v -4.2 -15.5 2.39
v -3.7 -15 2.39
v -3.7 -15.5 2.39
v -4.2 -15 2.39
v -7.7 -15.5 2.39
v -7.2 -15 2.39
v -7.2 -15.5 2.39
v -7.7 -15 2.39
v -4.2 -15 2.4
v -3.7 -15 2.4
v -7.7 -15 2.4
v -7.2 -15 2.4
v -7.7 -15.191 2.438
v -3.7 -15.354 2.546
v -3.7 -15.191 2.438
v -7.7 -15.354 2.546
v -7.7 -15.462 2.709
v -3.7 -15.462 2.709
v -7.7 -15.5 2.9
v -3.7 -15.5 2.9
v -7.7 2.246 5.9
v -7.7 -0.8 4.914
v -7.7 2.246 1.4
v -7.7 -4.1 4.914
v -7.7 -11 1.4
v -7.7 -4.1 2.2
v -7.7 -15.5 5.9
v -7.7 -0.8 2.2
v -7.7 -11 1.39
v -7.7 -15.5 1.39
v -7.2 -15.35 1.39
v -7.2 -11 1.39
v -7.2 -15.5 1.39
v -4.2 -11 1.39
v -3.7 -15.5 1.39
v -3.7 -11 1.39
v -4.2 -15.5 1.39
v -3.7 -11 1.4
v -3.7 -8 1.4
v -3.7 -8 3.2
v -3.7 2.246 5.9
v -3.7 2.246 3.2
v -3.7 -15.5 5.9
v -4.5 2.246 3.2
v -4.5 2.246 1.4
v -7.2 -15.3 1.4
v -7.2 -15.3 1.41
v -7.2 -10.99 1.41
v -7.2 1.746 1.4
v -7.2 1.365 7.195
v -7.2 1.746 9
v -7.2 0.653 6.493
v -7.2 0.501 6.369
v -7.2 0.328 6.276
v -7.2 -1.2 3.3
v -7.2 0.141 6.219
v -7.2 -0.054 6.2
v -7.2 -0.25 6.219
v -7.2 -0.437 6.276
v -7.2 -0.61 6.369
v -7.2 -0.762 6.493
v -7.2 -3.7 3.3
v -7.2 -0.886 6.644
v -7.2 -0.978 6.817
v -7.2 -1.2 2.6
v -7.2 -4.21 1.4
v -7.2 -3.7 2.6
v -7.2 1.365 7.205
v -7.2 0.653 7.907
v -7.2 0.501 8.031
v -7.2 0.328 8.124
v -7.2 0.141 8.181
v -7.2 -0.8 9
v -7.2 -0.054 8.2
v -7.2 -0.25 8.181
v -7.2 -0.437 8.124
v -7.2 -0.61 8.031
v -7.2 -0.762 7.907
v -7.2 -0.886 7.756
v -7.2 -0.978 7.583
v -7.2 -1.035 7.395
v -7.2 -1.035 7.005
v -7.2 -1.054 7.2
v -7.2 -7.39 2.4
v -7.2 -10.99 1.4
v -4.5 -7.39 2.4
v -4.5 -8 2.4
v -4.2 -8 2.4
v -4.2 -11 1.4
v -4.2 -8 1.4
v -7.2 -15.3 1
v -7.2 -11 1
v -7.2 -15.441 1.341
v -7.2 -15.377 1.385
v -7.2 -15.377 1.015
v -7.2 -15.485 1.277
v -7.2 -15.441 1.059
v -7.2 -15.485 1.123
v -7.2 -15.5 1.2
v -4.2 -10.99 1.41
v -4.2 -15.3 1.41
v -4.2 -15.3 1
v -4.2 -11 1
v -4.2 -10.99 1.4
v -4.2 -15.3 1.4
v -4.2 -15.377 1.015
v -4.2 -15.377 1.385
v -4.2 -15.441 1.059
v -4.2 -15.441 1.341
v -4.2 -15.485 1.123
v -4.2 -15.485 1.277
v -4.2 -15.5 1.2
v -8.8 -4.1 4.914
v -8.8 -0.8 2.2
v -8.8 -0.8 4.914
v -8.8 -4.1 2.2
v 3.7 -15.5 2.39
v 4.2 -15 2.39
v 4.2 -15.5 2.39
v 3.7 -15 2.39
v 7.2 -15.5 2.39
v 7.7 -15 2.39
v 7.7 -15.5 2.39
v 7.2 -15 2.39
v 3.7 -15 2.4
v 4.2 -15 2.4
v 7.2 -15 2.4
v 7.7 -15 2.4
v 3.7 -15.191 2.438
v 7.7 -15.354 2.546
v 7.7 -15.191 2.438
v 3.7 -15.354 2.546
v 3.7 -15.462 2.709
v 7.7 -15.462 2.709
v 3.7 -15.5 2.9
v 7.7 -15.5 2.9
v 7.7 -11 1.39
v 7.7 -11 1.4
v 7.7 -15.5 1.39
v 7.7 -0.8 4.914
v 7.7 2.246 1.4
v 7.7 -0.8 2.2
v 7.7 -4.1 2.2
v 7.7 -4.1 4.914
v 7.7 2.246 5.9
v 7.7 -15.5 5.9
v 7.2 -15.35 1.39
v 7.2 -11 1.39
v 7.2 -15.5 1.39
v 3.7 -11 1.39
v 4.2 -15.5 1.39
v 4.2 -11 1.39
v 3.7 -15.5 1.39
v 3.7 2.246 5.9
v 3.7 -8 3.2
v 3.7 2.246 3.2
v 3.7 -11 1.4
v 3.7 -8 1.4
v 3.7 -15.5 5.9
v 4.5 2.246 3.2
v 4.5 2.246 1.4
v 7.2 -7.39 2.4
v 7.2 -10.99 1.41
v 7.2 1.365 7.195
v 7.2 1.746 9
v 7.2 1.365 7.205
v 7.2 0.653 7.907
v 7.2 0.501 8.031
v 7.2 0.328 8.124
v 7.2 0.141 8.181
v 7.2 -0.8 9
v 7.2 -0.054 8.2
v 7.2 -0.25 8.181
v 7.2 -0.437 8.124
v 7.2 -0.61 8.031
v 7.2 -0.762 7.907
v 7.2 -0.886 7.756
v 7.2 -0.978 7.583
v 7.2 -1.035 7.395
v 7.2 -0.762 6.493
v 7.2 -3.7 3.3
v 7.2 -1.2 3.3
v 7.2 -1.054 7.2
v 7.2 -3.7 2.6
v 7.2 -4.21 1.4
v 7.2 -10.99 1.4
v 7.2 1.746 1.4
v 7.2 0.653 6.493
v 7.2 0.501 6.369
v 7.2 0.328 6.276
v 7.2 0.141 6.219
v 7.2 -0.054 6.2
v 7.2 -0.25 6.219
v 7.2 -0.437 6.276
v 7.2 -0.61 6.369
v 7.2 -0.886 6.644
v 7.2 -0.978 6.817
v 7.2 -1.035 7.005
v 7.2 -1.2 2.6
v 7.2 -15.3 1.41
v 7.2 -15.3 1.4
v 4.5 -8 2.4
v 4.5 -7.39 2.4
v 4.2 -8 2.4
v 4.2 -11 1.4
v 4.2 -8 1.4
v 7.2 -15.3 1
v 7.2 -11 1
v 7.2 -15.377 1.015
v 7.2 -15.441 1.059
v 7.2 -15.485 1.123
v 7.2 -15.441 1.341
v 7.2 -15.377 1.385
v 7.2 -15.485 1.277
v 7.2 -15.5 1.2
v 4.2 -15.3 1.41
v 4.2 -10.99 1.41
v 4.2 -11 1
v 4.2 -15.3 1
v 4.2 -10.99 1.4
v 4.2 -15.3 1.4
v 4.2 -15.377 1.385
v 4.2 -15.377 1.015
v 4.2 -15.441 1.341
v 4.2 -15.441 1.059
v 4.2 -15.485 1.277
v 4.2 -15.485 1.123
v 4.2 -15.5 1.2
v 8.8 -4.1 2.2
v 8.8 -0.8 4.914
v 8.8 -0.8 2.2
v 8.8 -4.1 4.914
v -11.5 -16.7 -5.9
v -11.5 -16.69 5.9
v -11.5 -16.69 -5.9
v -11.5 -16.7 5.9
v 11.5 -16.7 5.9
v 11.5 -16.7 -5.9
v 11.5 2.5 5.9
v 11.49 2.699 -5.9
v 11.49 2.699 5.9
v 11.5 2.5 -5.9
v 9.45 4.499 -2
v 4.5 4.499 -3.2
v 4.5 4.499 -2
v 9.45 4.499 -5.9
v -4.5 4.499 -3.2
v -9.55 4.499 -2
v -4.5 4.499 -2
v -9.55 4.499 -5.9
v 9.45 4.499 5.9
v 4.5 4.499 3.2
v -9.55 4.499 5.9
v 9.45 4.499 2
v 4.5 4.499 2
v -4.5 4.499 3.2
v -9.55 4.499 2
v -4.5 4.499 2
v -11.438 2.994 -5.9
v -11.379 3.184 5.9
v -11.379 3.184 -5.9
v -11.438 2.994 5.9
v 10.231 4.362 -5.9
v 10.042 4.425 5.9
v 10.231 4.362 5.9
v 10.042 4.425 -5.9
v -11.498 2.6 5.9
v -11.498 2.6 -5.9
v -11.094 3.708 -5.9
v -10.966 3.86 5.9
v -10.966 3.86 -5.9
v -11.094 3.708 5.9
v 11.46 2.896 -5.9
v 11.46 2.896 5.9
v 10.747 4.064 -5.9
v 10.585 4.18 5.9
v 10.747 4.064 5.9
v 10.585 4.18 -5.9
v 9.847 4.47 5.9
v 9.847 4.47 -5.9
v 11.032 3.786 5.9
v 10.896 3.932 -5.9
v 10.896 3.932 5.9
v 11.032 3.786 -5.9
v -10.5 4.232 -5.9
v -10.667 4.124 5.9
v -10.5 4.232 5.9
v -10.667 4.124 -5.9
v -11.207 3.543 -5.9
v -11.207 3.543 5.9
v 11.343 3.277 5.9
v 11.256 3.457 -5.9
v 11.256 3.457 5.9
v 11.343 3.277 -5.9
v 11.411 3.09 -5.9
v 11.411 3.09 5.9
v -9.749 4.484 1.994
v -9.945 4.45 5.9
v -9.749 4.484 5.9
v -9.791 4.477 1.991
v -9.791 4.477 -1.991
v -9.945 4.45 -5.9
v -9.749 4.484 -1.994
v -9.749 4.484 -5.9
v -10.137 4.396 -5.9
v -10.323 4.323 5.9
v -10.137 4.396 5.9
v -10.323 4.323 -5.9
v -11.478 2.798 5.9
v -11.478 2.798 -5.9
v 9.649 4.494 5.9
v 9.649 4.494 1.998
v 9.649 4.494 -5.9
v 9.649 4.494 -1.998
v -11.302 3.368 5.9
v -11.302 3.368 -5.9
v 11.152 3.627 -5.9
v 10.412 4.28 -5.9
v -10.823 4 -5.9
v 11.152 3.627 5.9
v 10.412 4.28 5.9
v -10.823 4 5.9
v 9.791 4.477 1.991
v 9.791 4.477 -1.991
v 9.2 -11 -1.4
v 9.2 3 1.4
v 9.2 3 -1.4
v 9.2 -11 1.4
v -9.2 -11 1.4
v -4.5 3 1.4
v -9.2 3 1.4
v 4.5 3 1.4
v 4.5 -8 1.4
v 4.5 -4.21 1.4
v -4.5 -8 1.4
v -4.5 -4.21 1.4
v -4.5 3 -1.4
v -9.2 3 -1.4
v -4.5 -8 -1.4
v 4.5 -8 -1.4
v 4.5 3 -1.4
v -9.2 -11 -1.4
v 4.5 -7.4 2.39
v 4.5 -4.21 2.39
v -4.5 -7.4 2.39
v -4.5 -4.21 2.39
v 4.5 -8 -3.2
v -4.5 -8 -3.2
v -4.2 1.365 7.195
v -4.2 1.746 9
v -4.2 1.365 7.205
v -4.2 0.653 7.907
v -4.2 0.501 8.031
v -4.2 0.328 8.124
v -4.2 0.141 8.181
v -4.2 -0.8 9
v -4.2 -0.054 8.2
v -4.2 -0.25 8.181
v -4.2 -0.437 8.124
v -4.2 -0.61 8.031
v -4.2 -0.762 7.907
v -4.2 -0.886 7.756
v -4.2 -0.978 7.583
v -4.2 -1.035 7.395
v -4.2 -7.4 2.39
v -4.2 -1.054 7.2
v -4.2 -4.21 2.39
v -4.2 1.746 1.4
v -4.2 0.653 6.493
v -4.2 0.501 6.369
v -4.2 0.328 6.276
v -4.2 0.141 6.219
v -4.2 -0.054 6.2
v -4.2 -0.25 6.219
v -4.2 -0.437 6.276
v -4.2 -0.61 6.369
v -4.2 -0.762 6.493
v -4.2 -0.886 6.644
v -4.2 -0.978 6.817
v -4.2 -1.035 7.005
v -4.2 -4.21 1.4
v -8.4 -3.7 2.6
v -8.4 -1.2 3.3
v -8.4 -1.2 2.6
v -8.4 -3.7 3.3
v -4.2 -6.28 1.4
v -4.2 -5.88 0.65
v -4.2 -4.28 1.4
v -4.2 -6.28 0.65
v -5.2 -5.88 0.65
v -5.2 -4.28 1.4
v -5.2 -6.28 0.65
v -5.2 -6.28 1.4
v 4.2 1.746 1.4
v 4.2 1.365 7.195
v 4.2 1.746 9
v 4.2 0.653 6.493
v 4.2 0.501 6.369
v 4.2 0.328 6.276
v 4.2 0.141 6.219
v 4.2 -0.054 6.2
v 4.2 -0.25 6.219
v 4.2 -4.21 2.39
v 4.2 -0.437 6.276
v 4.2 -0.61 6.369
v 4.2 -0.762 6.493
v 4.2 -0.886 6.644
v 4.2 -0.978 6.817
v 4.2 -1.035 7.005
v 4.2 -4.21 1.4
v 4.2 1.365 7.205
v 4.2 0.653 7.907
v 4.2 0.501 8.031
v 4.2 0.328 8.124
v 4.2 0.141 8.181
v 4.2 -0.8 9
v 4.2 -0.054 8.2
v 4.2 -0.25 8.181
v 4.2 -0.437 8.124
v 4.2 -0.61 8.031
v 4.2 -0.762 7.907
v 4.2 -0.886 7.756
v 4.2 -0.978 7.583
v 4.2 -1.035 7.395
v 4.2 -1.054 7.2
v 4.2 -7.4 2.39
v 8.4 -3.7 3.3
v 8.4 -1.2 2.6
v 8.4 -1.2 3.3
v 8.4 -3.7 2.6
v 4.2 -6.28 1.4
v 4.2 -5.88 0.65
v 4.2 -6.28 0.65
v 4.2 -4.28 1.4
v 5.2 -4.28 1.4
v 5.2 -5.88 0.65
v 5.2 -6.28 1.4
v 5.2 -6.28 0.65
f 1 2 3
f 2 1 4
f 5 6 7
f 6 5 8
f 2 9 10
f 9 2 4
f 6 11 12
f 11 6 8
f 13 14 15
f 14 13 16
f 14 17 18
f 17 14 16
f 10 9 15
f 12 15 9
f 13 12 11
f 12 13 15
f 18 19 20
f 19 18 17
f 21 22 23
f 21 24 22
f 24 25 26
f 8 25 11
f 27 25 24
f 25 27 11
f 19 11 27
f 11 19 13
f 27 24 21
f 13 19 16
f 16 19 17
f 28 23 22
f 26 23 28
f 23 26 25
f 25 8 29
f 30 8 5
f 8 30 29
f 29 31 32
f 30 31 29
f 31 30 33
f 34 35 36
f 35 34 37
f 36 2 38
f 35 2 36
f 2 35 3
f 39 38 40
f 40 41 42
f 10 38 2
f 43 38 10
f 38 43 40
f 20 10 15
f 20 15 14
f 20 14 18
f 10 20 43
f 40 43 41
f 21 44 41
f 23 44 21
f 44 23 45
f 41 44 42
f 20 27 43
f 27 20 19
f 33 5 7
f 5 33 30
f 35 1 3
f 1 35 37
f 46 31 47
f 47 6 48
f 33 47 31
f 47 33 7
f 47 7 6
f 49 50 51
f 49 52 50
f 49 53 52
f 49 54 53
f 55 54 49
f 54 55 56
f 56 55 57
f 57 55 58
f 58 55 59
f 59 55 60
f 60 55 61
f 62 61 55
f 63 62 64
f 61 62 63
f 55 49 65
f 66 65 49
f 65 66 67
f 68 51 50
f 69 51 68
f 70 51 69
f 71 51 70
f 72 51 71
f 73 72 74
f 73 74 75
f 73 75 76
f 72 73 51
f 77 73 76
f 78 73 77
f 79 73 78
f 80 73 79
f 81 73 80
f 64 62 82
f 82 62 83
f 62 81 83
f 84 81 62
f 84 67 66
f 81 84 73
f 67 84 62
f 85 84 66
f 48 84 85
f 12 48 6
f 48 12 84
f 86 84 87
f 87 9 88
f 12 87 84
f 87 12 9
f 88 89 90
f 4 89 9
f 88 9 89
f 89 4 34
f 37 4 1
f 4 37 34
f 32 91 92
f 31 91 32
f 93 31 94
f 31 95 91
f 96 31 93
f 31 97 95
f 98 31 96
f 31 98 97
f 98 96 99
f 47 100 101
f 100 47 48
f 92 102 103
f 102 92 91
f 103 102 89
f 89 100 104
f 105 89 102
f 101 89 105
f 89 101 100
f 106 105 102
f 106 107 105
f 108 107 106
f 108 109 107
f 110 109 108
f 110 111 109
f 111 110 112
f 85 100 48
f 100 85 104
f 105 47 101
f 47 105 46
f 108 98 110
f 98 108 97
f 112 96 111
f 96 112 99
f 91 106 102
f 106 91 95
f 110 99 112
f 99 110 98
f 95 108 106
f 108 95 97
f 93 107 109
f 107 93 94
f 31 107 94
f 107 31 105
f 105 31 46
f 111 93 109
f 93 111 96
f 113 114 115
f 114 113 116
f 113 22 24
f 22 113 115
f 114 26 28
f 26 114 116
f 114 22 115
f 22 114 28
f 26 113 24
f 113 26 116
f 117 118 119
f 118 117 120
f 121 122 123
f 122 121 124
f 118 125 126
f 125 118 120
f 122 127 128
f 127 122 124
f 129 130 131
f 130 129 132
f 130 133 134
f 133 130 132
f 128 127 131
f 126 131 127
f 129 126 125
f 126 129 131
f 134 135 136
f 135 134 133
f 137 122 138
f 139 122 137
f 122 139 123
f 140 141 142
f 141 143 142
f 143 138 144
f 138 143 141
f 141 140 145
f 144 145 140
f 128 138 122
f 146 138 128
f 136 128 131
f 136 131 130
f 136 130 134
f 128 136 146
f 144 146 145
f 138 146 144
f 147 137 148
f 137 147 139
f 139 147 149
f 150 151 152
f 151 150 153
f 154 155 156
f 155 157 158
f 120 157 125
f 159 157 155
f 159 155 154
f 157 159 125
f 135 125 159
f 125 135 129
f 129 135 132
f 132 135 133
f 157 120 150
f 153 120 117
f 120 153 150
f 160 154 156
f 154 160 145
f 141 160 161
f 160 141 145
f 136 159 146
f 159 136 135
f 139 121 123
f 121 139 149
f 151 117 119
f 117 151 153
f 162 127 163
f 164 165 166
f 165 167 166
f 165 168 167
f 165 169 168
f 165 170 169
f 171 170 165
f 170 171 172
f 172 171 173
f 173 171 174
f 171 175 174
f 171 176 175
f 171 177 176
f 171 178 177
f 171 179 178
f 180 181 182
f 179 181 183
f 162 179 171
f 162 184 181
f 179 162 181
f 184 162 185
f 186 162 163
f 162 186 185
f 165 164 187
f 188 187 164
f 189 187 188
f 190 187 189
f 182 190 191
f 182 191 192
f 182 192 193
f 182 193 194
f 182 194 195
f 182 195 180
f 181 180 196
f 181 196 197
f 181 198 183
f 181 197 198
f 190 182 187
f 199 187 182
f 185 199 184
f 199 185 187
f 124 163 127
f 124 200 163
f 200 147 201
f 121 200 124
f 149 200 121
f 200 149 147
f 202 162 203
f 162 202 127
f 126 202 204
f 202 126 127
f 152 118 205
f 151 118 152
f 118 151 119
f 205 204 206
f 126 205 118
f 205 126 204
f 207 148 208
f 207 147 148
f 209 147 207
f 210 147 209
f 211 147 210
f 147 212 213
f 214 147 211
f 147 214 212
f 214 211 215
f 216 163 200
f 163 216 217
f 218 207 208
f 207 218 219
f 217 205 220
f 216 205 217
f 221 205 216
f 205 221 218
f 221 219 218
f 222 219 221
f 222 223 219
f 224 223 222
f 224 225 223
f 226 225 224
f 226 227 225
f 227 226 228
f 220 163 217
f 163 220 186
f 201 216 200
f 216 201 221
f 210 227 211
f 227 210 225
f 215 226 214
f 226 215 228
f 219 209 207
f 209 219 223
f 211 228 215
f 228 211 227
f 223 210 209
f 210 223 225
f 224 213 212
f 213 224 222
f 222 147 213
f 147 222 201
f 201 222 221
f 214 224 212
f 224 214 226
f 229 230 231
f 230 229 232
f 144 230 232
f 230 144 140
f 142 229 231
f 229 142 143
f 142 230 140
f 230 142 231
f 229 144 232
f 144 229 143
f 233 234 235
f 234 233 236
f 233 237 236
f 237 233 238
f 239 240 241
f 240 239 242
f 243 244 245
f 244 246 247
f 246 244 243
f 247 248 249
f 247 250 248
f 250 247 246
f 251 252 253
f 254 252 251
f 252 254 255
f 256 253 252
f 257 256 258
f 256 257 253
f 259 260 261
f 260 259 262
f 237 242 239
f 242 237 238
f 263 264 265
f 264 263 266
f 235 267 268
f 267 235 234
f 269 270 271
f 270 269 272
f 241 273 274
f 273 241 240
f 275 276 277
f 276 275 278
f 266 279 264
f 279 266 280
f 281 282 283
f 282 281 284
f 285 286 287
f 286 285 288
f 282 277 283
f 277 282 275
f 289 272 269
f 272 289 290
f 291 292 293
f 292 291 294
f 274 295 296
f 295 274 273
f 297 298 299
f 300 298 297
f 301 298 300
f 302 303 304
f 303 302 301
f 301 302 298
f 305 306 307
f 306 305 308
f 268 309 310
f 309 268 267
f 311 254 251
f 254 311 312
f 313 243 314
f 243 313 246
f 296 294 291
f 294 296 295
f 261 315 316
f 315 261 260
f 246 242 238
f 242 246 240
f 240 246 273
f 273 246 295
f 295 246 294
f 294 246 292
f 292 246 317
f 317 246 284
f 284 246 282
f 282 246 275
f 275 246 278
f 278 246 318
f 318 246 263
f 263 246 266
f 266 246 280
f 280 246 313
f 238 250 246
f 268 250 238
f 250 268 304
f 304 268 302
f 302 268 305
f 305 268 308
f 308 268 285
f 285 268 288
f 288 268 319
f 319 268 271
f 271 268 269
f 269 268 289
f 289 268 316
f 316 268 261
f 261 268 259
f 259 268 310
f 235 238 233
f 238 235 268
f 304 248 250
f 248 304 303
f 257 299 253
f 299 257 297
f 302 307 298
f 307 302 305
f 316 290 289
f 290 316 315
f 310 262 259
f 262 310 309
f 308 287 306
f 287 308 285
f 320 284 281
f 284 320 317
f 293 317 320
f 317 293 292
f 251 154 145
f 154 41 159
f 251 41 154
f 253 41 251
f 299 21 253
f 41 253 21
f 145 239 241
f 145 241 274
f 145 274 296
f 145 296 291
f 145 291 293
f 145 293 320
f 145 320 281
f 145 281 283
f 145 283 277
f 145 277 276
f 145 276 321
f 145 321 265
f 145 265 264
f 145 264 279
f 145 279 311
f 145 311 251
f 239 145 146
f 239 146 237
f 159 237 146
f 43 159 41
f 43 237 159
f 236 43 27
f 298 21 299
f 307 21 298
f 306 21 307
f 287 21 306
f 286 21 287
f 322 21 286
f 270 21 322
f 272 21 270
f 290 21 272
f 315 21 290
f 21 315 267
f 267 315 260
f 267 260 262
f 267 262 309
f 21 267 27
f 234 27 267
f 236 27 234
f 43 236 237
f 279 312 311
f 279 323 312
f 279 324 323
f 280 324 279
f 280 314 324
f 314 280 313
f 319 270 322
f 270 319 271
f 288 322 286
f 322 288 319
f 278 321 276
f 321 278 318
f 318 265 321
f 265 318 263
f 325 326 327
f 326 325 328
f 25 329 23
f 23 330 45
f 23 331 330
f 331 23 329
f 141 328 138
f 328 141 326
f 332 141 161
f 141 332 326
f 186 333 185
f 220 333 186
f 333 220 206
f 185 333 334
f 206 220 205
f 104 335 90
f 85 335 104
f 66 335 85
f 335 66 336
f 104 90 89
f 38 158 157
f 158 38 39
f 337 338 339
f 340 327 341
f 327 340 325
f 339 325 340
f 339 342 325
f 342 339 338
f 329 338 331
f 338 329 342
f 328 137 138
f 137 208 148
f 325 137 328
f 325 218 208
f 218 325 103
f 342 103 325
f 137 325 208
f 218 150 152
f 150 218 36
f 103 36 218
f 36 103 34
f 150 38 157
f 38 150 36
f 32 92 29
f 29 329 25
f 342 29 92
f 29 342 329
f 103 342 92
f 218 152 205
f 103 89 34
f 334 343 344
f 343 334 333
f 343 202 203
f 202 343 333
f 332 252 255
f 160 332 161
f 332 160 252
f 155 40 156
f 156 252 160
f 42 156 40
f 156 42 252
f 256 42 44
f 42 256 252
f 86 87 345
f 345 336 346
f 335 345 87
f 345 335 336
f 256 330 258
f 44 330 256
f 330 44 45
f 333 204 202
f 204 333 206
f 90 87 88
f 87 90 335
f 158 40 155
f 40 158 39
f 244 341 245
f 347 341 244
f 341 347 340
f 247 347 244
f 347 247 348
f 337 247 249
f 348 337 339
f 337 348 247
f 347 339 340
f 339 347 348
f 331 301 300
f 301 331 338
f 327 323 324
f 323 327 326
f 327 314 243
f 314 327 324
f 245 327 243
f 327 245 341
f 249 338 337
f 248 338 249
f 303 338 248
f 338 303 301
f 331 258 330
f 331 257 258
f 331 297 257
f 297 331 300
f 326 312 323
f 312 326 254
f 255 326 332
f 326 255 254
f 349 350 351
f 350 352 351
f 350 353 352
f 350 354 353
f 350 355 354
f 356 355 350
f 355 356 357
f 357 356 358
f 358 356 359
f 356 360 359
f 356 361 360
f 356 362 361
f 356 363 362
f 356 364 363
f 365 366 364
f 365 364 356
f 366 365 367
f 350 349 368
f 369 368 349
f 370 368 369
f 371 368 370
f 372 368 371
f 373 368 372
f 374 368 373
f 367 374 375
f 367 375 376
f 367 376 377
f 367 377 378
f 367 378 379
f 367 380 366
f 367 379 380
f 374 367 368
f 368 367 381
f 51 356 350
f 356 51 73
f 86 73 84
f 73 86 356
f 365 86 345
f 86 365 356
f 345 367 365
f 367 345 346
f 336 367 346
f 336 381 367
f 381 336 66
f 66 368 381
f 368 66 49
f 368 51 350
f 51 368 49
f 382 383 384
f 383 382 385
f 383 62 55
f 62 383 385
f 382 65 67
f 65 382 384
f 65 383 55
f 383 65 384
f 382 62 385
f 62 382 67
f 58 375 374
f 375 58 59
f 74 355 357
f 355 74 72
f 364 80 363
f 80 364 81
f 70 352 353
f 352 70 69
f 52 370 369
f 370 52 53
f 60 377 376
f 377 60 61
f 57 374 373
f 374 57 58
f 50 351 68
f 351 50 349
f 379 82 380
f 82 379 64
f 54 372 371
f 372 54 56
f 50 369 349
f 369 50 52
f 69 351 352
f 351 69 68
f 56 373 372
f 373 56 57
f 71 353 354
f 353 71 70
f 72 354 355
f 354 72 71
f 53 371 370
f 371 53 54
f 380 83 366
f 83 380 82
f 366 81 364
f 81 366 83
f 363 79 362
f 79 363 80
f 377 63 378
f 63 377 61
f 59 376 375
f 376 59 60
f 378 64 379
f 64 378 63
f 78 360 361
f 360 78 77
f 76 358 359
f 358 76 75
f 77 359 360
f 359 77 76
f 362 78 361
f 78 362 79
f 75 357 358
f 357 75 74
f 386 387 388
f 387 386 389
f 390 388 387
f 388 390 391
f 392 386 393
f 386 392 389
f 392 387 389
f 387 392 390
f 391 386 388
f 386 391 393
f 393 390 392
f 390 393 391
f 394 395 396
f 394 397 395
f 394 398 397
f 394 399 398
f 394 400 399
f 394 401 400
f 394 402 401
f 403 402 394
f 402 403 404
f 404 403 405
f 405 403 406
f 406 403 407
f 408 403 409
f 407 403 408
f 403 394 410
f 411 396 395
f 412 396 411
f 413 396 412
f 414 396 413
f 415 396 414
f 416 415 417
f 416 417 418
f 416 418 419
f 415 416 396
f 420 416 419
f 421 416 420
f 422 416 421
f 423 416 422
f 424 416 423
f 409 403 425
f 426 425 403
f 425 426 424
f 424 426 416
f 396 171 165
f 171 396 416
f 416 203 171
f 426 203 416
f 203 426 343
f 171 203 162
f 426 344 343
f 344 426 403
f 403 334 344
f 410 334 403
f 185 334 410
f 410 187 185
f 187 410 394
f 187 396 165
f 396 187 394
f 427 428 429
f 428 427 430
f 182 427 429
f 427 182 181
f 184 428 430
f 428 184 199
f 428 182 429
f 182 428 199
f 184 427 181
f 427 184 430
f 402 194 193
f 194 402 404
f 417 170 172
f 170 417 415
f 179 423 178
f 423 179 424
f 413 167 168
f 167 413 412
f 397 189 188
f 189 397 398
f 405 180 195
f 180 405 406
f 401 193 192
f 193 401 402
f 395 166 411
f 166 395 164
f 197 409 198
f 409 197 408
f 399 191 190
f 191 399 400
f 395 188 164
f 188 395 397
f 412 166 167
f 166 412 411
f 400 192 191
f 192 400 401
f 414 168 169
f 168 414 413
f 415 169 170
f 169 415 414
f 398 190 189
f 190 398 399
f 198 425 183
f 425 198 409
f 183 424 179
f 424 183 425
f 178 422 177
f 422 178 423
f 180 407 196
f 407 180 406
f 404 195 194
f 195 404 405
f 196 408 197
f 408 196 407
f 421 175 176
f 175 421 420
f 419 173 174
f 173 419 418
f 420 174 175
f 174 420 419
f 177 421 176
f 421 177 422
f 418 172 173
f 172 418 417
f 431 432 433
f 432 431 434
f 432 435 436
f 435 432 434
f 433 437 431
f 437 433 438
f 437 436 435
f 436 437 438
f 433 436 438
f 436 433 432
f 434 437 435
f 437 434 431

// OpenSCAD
// file: strain_gauge_plate.scad
// Strain-gauge flexure plate
//
// Geometry taken from StrainGauge.step (Onshape AP242 export, "Part Studio 1 -
// Part 1"). The STEP profile is reproduced segment for segment, so this model
// and the CAD file describe the same solid.
//
// The bought load cell is shorter [measured 2026-11-21]: 30 x 23.3 x 2.5, its arms and
// the W's bottom block ending 1.7 earlier at the open edge (-y); the slots' closed ends
// and the top are as in the STEP. So every point of the profile at the open edge
// (y <= -11) moves up by `shorter`, and the plate runs from y = -10.8 to +12.5: the
// origin stays where the STEP's centre is, so the holders keep their frame.
//
// The STEP's envelope 30 x 25 x 2.5 mm. Two hairpin slots, 3 mm wide, open at the bottom
// edge, run up the plate, turn across the top and return to a closed end. Arms
// and webs are also 3 mm wide, and every free end is a half-round cap of that
// diameter. All corners are R1.5 except the two top corners at R3.
//
// Coordinates: origin at the centre of the part in all three axes, so the
// material runs from z = -thickness/2 to +thickness/2. The STEP file itself
// places the plate from z = 0 upwards — this model is shifted down by 1.25 mm
// against it, everything else is identical.

/* [Size] */
thickness = 2.5;     // mm, as modelled in the STEP
shorter   = 1.7;     // mm the bought cell's arms end earlier [measured 2026-11-21]; 0: the STEP

/* [Output] */
export_2d = false;   // true renders the flat profile only

/* [Resolution] */
arc_step = 3;        // degrees per tessellated arc segment

// Profile loop as exported from the STEP, in mm:
//   ["L", start, end]
//   ["A", start, end, centre, radius, counter-clockwise]
profile = [
  ["A", [-7.5, -12.5], [-9, -11], [-7.5, -11], 1.5, false],
  ["L", [-9, -11], [-9, 2]],
  ["A", [-9, 2], [-6, 2], [-7.5, 2], 1.5, false],
  ["L", [-6, 2], [-6, -5]],
  ["A", [-6, -5], [-3, -5], [-4.5, -5], 1.5, true],
  ["L", [-3, -5], [-3, 5]],
  ["A", [-3, 5], [-4.5, 6.5], [-4.5, 5], 1.5, true],
  ["L", [-4.5, 6.5], [-10.5, 6.5]],
  ["A", [-10.5, 6.5], [-12, 5], [-10.5, 5], 1.5, true],
  ["L", [-12, 5], [-12, -11]],
  ["A", [-12, -11], [-15, -11], [-13.5, -11], 1.5, false],
  ["L", [-15, -11], [-15, 9.5]],
  ["A", [-15, 9.5], [-12, 12.5], [-12, 9.5], 3, false],
  ["L", [-12, 12.5], [12, 12.5]],
  ["A", [12, 12.5], [15, 9.5], [12, 9.5], 3, false],
  ["L", [15, 9.5], [15, -11]],
  ["A", [15, -11], [12, -11], [13.5, -11], 1.5, false],
  ["L", [12, -11], [12, 5]],
  ["A", [12, 5], [10.5, 6.5], [10.5, 5], 1.5, true],
  ["L", [10.5, 6.5], [4.5, 6.5]],
  ["A", [4.5, 6.5], [3, 5], [4.5, 5], 1.5, true],
  ["L", [3, 5], [3, -5]],
  ["A", [3, -5], [6, -5], [4.5, -5], 1.5, true],
  ["L", [6, -5], [6, 2]],
  ["A", [6, 2], [9, 2], [7.5, 2], 1.5, false],
  ["L", [9, 2], [9, -11]],
  ["A", [9, -11], [7.5, -12.5], [7.5, -11], 1.5, false],
  ["L", [7.5, -12.5], [-7.5, -12.5]]
];

function ang(c, p) = atan2(p[1] - c[1], p[0] - c[0]);

function seg_points(s) =
    s[0] == "L" ? [s[1]]
    : let (c = s[3], r = s[4], ccw = s[5],
           a1 = ang(c, s[1]),
           a2raw = ang(c, s[2]),
           a2 = ccw ? (a2raw <= a1 ? a2raw + 360 : a2raw)
                    : (a2raw >= a1 ? a2raw - 360 : a2raw),
           n = max(2, ceil(abs(a2 - a1) / arc_step)))
      [for (i = [0 : n - 1])
          let (a = a1 + (a2 - a1) * i / n)
          [c[0] + r * cos(a), c[1] + r * sin(a)]];

function outline() = [for (s = profile) for (p = seg_points(s)) p[1] <= -11 + 1e-6 ? [p[0], p[1] + shorter] : p];

module plate_profile() { polygon(outline()); }

if (export_2d) plate_profile();
else linear_extrude(height = thickness, center = true) plate_profile();
// main file
// Inner holder for the strain-gauge flexure plate
//
// Slides onto the W-shaped inner part from below (+y in the top view) and grips
// it from above and below. The gauge leads run forward and leave through the
// mouth, in +y, towards the outer holder. It stays clear of the two outer arms, which are the
// fixed mounting points, so this holder can move with the loaded inner part.
//
// Coordinates: origin at the centre of the plate in all three axes, so the
// plate runs from z = -plate_t/2 to +plate_t/2 and this holder is symmetric
// about z = 0.
//
// Printing: stand it on the closed end (the bridge, -y) with the mouth facing
// up. The pocket is then a blind slot opening upwards, so nothing has to be
// bridged or supported, and both fitted dimensions lie in the machine's XY
// plane, where they behave the same way. Printed the other way up, the top
// plate has to bridge 18 mm and lands rough on the face that grips the plate.
//
// The W is the bottom block with its three upward prongs: the two webs at
// |x| = 6..9 and the central column at |x| < 3. The open slots at |x| = 9..12
// run from the bottom edge up to y = 6.5, which is what the side walls use to
// reach through the plate.

/* [Flexure plate — read from the STEP, do not edit; plate_bot the bought cell's] */
plate_t    = 2.5;    // plate thickness
web_outer  = 9;      // outer face of the webs = inner edge of the open slot
arm_inner  = 12;     // inner face of the outer arms = outer edge of the slot
plate_bot  = -10.8;  // bottom edge of the plate: the bought cell's [measured 2026-11-21;
                     //   -12.5 in the STEP] (strain_gauge_plate.scad, shorter)
web_tip    = 3.5;    // top of the two web prongs
slot_top   = 6.5;    // where the open slots close at the U-turn

/* [Holder] */
wall       = 4.5;    // thickness above and below the plate [given: thicker walls for strength;
                     //   was 3: bending stress in them about (3/4.5)^2 = 0.44 as much]
fit        = 0.3;    // clearance on the plate thickness, total (0.15 per face)
w_clear    = 0.2;    // clearance to the W — this is the sliding fit.
                     //   0.05  precision machined
                     //   0.1   milled / reamed
                     //   0.15  SLA / resin, or a well tuned FDM machine
                     //   0.2   FDM  (default — set for 3D printing)
                     // The walls guide along 17 mm of the webs, so too tight
                     // here binds rather than grips.
arm_clear  = 0.5;    // clearance to the fixed outer arms — must never touch
reach      = 1.0;    // how far past the web tips the holder covers
back       = 5.7;    // thickness of the closing bridge below the plate: 4 below the STEP's
                     //   edge, and the 1.7 the bought cell is shorter, so that the holder's
                     //   back (y -16.7), the tongue's root in the bridge and the bass's socket
                     //   stay where they were
corner_r   = 2;      // radius on the two vertical edges at the mouth corners,
                     // i.e. at (+x, y_front) and (-x, y_front)
side_walls = true;   // true: walls reach through the open slots (stiffer box)

/* [Lead-in] */
lead_in    = 1.5;    // length of the flared mouth, 0 disables it
lead_c     = 0.6;    // how much the mouth is flared, per side

/* [Gauge and cable recess] */
recess_d   = 1.8;    // depth, cut into the inner face of each plate. The bought cell's lead
                     //   is glued along the whole column, across its width, 4 thick on the
                     //   plate's 2.5: 1.5 proud of one face [measured 2026-11-21]; 1.8 and
                     //   the 0.15 fit leave it 0.45 (was 1.0, for the STEP's bare plate).
                     //   The glue is 7.1 wide at most and runs from the +y edge to y -6.5:
                     //   0.95 to the recess's sides, 1.5 to its back end (recess_back)
                     //   Both faces, so the plate goes in either way up
recess_w   = 9.0;    // width, centred on the column. The column is 6 mm wide
                     // and the inner slots run from |x| = 3 to 6, so 9 mm puts
                     // the recess edges mid-slot: 1.5 mm clear of the column,
                     // 1.5 mm clear of the webs it clamps on.
recess_back = -8.0;  // back end of the recess, just behind the gauge
gauge_y    = -3.5;   // gauge centre, for reference only

/* [Latch] */
// A spring tongue in the top wall each side, its tooth in the inner slot between web and
// column (|x| 3 .. 6), behind the slot's closed end (y -6.5): it rides over the W's
// bottom block while the holder slides on and drops into the slot at the end. It only
// touches the W, never the column or the fixed arms, so the force still runs through
// the column [given: latch in both positions]. The tongue bends into a relief in its
// own wall, so it needs no room outside the holder.
//   "lock"    retaining face square: holds the strap's pull; a lug on the tongue's end
//             carries a steel rod across all four tongues of the bass's two holders, which
//             lifts them at once (playing position; below, and ../bass/link.scad)
//   "detent"  retaining face at 45 deg: holds the discant's weight, a firm pull
//             releases it; no lug (the stored position's socket, inside the deck)
//   "none"    no latch
latch    = "lock";
// tongue thickness: the wall's inner layer. The detent's is thicker [chosen 2026-11-15]:
// in PETG (E about 2000 MPa) a 1.2 tongue holds the stored discant with about 15 N against
// its 3.5 N, twice the 1.0's, at 1.3 % strain at the root (see the echo)
tongue_t = latch == "detent" ? 1.2 : 1.0;
tongue_x = [4.2, 7.2];   // tongue, x; mirrored
tongue_y = [-15.5, -4.2];   // root (in the bridge) to tip
tooth_x  = [4.2, 5.2];   // in the inner slot (3 .. 6), 1.0 from the column's edge
tooth_y0 = -6.28;    // retaining face: the slot's arc end is at -6.33 .. -6.47 across the tooth
tooth_d  = 0.6;      // how far the tooth reaches into the plate's thickness
cut_w    = 0.5;      // the slot round the tongue
// [chosen 2026-11-15, PETG] Under the tongue's first 2.8 mm the bridge stood solid, so it
// bent only from the pocket's edge (y -12.7): 8.5 mm long, 1.25 % at the root, a sharp
// corner on the tension side. A slot under it frees its whole length (11.3 mm, 0.7 %);
// its end is round, and the corner above the root has a fillet.
under_h  = 0.4;      // the slot under the tongue's root, ending round at the root
root_r   = 0.5;      // fillet in the corner above the root
// The detent's stop: a bar across the slot over the tongue, under which the tongue lifts
// stop_gap and no further: the tooth needs 0.6 to clear the W. (The lock's stop is its
// ear, below.)
stop_gap = 0.85;
stop_y   = [-7.0, -5.6]; // behind the tongue's tip, over the tooth (the detent only, below)

// THE LOCK'S LUG AND ROD [chosen 2026-11-15: lift all four tongues at once; the bass is
// printed standing on its hand face, so the holders stand on their bridges and grow in
// +y]. Everything grows support-free in +y: the lug rises from the tongue at 45 deg and
// runs on past the tongue's tip, in the slot, which goes on to slot_end; at its end it
// carries a cross hole for a stock steel rod (rod_d) through the lugs of all four
// tongues (../bass/link.scad: latch_rod()). The rod is pressed in after printing. The
// lug makes the tongue rigid from lug_y0 on, so it bends over lug_y0 - tongue_y[0].
// The stop is an ear on the lug's outer side in a pocket in the slot's wall: the wall
// over it ends the lift (no bar over the tongue, so the lug can grow at 45 deg); the
// rod's slack in its holes is not counted.
rod_d    = 2.0;      // steel rod, e.g. stainless 2 mm, cut to length [stock]
rod_hole = 2.0;      // printed undersize by a little: a light press fit; ream if too tight
rod_gap  = 0.3;      // the rod's underside over the holder's top face
lug_wall = 0.8;      // round the hole
lug_y0   = -7.4;     // where the lug rises from the tongue: rigid from here on
ear_w    = 1.2;      // the ear: from the tongue's outer side (tongue_x[1]), 0.7 into the wall
ear_z    = [2.6, 3.3];
ear_c    = 0.4;      // the ear's clearance in its pocket (all sides but the lift)
lift_t   = 0.85;     // the tooth's lift at the stop (the W needs tooth_d)

/* [Preview] */
show_plate = false;  // true also draws the flexure plate, for checking fits

use <strain_gauge_plate.scad>

$fa = 2; $fs = 0.2;

top_z    = plate_t / 2 + fit / 2 + wall;          // the holder's top face (5.9)
z_low    = -plate_t / 2 - fit / 2;                // underside of the pocket
z_high   =  plate_t / 2 + fit / 2;                // top of the pocket
z_bot    = z_low - wall;                          // underside of the holder
height   = wall + fit + plate_t + wall;           // total height
outer_x  = side_walls ? arm_inner - arm_clear     // 11.5 — walls sit in the slots
                      : web_outer + 1;            // 10   — plates only, 2 mm clear
pocket_x = side_walls ? web_outer + w_clear       // 9.1  — inner face of the walls
                      : outer_x + 1;              // cut right through in x
y_front  = web_tip + reach;                       // front edge of the holder
y_mouth  = plate_bot - w_clear;                   // inner face of the bridge
y_back   = y_mouth - back;                        // outer face of the bridge

echo(str("inner holder  ", 2 * outer_x, " x ", y_front - y_back, " x ", height, " mm"));
echo(str("clearance to outer arm: ", arm_inner - outer_x, " mm"));
echo(str("slide fit on the W:     ", pocket_x - web_outer, " mm per side, ",
         fit / 2, " mm per face"));
echo(str("clearance above web tips: ", slot_top - y_front, " mm to the U-turn"));
echo(str("recess ", recess_w, " x ", y_front - recess_back, " x ", recess_d,
         " mm, opens at the mouth, remaining wall ", wall - recess_d, " mm"));
echo(str("clamped behind the recess from y = ", y_mouth, " to ", recess_back));
echo(str("mouth corners rounded R", corner_r, "; side wall there tapers from ",
         outer_x - pocket_x, " mm to nothing over the last ", corner_r, " mm"));

// Recess in one plate: clears the gauge and carries its leads forward, out of
// the mouth in +y. s = +1 cuts the top plate, s = -1 the bottom one.
module recess(s) {
    z0 = (s > 0) ? z_high : z_low - recess_d;
    translate([-recess_w / 2, recess_back, z0])
        cube([recess_w, y_front - recess_back + 1, recess_d]);
}

// Flared mouth: makes a printed holder start onto the plate instead of
// catching on the first layer's edge.
module mouth() {
    hull() {
        translate([-pocket_x, y_front - lead_in, z_low])
            cube([2 * pocket_x, 0.01, plate_t + fit]);
        translate([-pocket_x - lead_c, y_front, z_low - lead_c])
            cube([2 * (pocket_x + lead_c), 0.01, plate_t + fit + 2 * lead_c]);
    }
}

// Outer footprint: square at the closed end, the two corners at the mouth
// rounded. Extruded in z, so both vertical edges there carry the radius.
module outline() {
    hull() {
        translate([ outer_x - corner_r, y_front - corner_r]) circle(r = corner_r);
        translate([-outer_x + corner_r, y_front - corner_r]) circle(r = corner_r);
        translate([-outer_x, y_back]) square([2 * outer_x, 0.01]);
    }
}

// the tooth, x [0, w], in y-z: retaining face at y = 0 (square, or at 45 deg for the
// detent), the lead-in ramp towards +y, which the plate's edge meets first
tooth_h = z_high - (plate_t / 2 - tooth_d);       // from the pocket's ceiling down
module tooth(w, angle) {
    ret = tooth_h / tan(angle);                   // the retaining face's run
    rotate([90, 0, 90]) linear_extrude(w) polygon([
        [0, tooth_h], [ret, 0], [ret + 0.4, 0], [ret + 0.4 + 1.6, tooth_h]]);
}
// the lock's lug, rod and ear (see [Latch])
z_t      = z_high + tongue_t;                     // the tongue's top
rod_zc   = top_z + rod_gap + rod_d / 2;           // the rod's axis, z
lug_top  = rod_zc + rod_hole / 2 + lug_wall;
lug_r    = rod_hole / 2 + lug_wall;
rod_yc   = lug_y0 + (rod_zc - z_t) + lug_r * sqrt(2);   // its wall lug_wall off the 45 deg face
lug_y1   = rod_yc + lug_r;                        // the lug's end
slot_end = latch == "lock" ? lug_y1 + cut_w : tongue_y[1] + cut_w;
ear_y    = [tongue_y[1] + 0.5, tongue_y[1] + 3.0];   // just past the tongue's tip: the less it lifts there, the less pocket
// lifts along the tongue, per unit force over EI, for a load at xl from the root: bending
// up to the lug, rigid past it
lug_a = lug_y0 - tongue_y[0];
function defl(x, xl) = let(a = min(lug_a, xl)) x <= a ? x * x * (3 * xl - x) / 6
    : a * a * (3 * xl - a) / 6 + a * (2 * xl - a) / 2 * (x - a);
x_tooth = tooth_y0 - tongue_y[0];
x_rod   = rod_yc - tongue_y[0];
ear_gap = lift_t * defl(ear_y[1] - tongue_y[0], x_rod) / defl(x_tooth, x_rod);
rod_lift = lift_t * defl(x_rod, x_rod) / defl(x_tooth, x_rod);
// root strain = deflection x load distance x t / (2 defl)
function root_strain(d, x, xl) = 100 * d * xl * tongue_t / (2 * defl(x, xl));
// the rod in this holder's frame: [y, z of its axis, d]
function latch_rod() = [rod_yc, rod_zc, rod_d];
function latch_top() = lug_top;

module latch_cuts() for (s = [-1, 1]) mirror([s < 0 ? 1 : 0, 0, 0]) {
    difference() {
        translate([tongue_x[0] - cut_w, tongue_y[0], z_high - 0.01])
            cube([tongue_x[1] - tongue_x[0] + 2 * cut_w, slot_end - tongue_y[0], wall + 1]);
        translate([tongue_x[0], tongue_y[0] - 1, z_high - 0.02])
            cube([tongue_x[1] - tongue_x[0], tongue_y[1] - tongue_y[0] + 1, tongue_t + 0.02]);
        // the fillet above the root: left standing in the corner of tongue and wall
        translate([tongue_x[0] - cut_w - 0.01, tongue_y[0] - 0.01, z_high + tongue_t - 0.01]) difference() {
            cube([tongue_x[1] - tongue_x[0] + 2 * cut_w + 0.02, root_r + 0.01, root_r + 0.01]);
            translate([-0.01, root_r + 0.01, root_r + 0.01]) rotate([0, 90, 0])
                cylinder(r = root_r, h = tongue_x[1] - tongue_x[0] + 2 * cut_w + 0.04);
        }
        // the detent's stop: a bar over the tongue, stop_gap above it
        if (latch != "lock") translate([tongue_x[0] - cut_w - 0.02, stop_y[0], z_high + tongue_t + stop_gap])
            cube([tongue_x[1] - tongue_x[0] + 2 * cut_w + 0.04, stop_y[1] - stop_y[0], wall]);
    }
    // the lock's ear pocket in the slot's outer wall: the wall over it is the stop
    if (latch == "lock")
        translate([tongue_x[1] + cut_w - 0.01, ear_y[0] - ear_c, ear_z[0] - ear_c])
            cube([ear_w - cut_w + ear_c + 0.01, ear_y[1] - ear_y[0] + 2 * ear_c, ear_z[1] - ear_z[0] + ear_c + ear_gap]);
    // the slot under the root, from the pocket back to the root, its end round
    translate([tongue_x[0], tongue_y[0] + under_h / 2, z_high - under_h]) {
        cube([tongue_x[1] - tongue_x[0], y_mouth - tongue_y[0] - under_h / 2 + 0.01, under_h + 0.01]);
        translate([0, 0, under_h / 2]) rotate([0, 90, 0]) cylinder(d = under_h, h = tongue_x[1] - tongue_x[0], $fn = 16);
    }
}
// root strain when the W lifts the tooth tooth_d (load at the tooth) and at the stop
echo(latch == "lock"
    ? str("latch tongue (lock): bends over ", lug_a, " mm; root strain at the tooth's ", tooth_d, " mm lift ",
          round(10 * root_strain(tooth_d, x_tooth, x_tooth)) / 10, " %; rod at y ", round(100 * rod_yc) / 100,
          " z ", rod_zc, ", lifts ", round(100 * rod_lift) / 100, " mm to the stop (tooth ", lift_t, "), root strain there ",
          round(10 * root_strain(rod_lift, x_rod, x_rod)) / 10, " %; ear gap ", round(100 * ear_gap) / 100,
          "; lug top ", lug_top)
    : str("latch tongue (", latch, "): free ", tongue_y[1] - tongue_y[0], " mm, root strain at the tooth's ", tooth_d,
          " mm lift ", round(10 * root_strain(tooth_d, x_tooth, x_tooth)) / 10, " % (tongue ", tongue_t, ")"));
module latch_parts() for (s = [-1, 1]) mirror([s < 0 ? 1 : 0, 0, 0]) {
    translate([tooth_x[0], tooth_y0, z_high - tooth_h]) tooth(tooth_x[1] - tooth_x[0], latch == "lock" ? 90 : 45);
    if (latch == "lock") difference() {
        union() {
            // the lug in y-z: from the tongue at 45 deg up to its top, on to its end
            translate([tongue_x[0], 0, 0]) rotate([90, 0, 90]) linear_extrude(tongue_x[1] - tongue_x[0])
                polygon([[lug_y0, z_t - 0.01], [lug_y0 + lug_top - z_t, lug_top], [lug_y1, lug_top],
                         [lug_y1, z_high], [tongue_y[1] - 0.01, z_high], [tongue_y[1] - 0.01, z_t - 0.01]]);
            // the ear: the stop, in its pocket
            translate([tongue_x[1] - 0.01, ear_y[0], ear_z[0]]) cube([ear_w + 0.01, ear_y[1] - ear_y[0], ear_z[1] - ear_z[0]]);
        }
        // the rod's hole, along x, pointed upwards in the print (+y)
        translate([tongue_x[0] - 1, rod_yc, rod_zc]) rotate([0, 90, 0]) linear_extrude(tongue_x[1] - tongue_x[0] + 2)
            hull() { circle(d = rod_hole); translate([0, rod_hole / 2 * sqrt(2)]) square(0.01, center = true); }
    }
}

module inner_holder() {
    difference() {
        translate([0, 0, z_bot]) linear_extrude(height = height) outline();

        // pocket the plate slides into, open towards +y
        translate([-pocket_x, y_mouth, z_low])
            cube([2 * pocket_x, y_front - y_mouth + 1, plate_t + fit]);

        recess(1);
        recess(-1);
        if (lead_in > 0) mouth();
        if (latch != "none") latch_cuts();
    }
    if (latch != "none") latch_parts();
}

inner_holder();

if (show_plate) %linear_extrude(height = plate_t) plate_profile();
